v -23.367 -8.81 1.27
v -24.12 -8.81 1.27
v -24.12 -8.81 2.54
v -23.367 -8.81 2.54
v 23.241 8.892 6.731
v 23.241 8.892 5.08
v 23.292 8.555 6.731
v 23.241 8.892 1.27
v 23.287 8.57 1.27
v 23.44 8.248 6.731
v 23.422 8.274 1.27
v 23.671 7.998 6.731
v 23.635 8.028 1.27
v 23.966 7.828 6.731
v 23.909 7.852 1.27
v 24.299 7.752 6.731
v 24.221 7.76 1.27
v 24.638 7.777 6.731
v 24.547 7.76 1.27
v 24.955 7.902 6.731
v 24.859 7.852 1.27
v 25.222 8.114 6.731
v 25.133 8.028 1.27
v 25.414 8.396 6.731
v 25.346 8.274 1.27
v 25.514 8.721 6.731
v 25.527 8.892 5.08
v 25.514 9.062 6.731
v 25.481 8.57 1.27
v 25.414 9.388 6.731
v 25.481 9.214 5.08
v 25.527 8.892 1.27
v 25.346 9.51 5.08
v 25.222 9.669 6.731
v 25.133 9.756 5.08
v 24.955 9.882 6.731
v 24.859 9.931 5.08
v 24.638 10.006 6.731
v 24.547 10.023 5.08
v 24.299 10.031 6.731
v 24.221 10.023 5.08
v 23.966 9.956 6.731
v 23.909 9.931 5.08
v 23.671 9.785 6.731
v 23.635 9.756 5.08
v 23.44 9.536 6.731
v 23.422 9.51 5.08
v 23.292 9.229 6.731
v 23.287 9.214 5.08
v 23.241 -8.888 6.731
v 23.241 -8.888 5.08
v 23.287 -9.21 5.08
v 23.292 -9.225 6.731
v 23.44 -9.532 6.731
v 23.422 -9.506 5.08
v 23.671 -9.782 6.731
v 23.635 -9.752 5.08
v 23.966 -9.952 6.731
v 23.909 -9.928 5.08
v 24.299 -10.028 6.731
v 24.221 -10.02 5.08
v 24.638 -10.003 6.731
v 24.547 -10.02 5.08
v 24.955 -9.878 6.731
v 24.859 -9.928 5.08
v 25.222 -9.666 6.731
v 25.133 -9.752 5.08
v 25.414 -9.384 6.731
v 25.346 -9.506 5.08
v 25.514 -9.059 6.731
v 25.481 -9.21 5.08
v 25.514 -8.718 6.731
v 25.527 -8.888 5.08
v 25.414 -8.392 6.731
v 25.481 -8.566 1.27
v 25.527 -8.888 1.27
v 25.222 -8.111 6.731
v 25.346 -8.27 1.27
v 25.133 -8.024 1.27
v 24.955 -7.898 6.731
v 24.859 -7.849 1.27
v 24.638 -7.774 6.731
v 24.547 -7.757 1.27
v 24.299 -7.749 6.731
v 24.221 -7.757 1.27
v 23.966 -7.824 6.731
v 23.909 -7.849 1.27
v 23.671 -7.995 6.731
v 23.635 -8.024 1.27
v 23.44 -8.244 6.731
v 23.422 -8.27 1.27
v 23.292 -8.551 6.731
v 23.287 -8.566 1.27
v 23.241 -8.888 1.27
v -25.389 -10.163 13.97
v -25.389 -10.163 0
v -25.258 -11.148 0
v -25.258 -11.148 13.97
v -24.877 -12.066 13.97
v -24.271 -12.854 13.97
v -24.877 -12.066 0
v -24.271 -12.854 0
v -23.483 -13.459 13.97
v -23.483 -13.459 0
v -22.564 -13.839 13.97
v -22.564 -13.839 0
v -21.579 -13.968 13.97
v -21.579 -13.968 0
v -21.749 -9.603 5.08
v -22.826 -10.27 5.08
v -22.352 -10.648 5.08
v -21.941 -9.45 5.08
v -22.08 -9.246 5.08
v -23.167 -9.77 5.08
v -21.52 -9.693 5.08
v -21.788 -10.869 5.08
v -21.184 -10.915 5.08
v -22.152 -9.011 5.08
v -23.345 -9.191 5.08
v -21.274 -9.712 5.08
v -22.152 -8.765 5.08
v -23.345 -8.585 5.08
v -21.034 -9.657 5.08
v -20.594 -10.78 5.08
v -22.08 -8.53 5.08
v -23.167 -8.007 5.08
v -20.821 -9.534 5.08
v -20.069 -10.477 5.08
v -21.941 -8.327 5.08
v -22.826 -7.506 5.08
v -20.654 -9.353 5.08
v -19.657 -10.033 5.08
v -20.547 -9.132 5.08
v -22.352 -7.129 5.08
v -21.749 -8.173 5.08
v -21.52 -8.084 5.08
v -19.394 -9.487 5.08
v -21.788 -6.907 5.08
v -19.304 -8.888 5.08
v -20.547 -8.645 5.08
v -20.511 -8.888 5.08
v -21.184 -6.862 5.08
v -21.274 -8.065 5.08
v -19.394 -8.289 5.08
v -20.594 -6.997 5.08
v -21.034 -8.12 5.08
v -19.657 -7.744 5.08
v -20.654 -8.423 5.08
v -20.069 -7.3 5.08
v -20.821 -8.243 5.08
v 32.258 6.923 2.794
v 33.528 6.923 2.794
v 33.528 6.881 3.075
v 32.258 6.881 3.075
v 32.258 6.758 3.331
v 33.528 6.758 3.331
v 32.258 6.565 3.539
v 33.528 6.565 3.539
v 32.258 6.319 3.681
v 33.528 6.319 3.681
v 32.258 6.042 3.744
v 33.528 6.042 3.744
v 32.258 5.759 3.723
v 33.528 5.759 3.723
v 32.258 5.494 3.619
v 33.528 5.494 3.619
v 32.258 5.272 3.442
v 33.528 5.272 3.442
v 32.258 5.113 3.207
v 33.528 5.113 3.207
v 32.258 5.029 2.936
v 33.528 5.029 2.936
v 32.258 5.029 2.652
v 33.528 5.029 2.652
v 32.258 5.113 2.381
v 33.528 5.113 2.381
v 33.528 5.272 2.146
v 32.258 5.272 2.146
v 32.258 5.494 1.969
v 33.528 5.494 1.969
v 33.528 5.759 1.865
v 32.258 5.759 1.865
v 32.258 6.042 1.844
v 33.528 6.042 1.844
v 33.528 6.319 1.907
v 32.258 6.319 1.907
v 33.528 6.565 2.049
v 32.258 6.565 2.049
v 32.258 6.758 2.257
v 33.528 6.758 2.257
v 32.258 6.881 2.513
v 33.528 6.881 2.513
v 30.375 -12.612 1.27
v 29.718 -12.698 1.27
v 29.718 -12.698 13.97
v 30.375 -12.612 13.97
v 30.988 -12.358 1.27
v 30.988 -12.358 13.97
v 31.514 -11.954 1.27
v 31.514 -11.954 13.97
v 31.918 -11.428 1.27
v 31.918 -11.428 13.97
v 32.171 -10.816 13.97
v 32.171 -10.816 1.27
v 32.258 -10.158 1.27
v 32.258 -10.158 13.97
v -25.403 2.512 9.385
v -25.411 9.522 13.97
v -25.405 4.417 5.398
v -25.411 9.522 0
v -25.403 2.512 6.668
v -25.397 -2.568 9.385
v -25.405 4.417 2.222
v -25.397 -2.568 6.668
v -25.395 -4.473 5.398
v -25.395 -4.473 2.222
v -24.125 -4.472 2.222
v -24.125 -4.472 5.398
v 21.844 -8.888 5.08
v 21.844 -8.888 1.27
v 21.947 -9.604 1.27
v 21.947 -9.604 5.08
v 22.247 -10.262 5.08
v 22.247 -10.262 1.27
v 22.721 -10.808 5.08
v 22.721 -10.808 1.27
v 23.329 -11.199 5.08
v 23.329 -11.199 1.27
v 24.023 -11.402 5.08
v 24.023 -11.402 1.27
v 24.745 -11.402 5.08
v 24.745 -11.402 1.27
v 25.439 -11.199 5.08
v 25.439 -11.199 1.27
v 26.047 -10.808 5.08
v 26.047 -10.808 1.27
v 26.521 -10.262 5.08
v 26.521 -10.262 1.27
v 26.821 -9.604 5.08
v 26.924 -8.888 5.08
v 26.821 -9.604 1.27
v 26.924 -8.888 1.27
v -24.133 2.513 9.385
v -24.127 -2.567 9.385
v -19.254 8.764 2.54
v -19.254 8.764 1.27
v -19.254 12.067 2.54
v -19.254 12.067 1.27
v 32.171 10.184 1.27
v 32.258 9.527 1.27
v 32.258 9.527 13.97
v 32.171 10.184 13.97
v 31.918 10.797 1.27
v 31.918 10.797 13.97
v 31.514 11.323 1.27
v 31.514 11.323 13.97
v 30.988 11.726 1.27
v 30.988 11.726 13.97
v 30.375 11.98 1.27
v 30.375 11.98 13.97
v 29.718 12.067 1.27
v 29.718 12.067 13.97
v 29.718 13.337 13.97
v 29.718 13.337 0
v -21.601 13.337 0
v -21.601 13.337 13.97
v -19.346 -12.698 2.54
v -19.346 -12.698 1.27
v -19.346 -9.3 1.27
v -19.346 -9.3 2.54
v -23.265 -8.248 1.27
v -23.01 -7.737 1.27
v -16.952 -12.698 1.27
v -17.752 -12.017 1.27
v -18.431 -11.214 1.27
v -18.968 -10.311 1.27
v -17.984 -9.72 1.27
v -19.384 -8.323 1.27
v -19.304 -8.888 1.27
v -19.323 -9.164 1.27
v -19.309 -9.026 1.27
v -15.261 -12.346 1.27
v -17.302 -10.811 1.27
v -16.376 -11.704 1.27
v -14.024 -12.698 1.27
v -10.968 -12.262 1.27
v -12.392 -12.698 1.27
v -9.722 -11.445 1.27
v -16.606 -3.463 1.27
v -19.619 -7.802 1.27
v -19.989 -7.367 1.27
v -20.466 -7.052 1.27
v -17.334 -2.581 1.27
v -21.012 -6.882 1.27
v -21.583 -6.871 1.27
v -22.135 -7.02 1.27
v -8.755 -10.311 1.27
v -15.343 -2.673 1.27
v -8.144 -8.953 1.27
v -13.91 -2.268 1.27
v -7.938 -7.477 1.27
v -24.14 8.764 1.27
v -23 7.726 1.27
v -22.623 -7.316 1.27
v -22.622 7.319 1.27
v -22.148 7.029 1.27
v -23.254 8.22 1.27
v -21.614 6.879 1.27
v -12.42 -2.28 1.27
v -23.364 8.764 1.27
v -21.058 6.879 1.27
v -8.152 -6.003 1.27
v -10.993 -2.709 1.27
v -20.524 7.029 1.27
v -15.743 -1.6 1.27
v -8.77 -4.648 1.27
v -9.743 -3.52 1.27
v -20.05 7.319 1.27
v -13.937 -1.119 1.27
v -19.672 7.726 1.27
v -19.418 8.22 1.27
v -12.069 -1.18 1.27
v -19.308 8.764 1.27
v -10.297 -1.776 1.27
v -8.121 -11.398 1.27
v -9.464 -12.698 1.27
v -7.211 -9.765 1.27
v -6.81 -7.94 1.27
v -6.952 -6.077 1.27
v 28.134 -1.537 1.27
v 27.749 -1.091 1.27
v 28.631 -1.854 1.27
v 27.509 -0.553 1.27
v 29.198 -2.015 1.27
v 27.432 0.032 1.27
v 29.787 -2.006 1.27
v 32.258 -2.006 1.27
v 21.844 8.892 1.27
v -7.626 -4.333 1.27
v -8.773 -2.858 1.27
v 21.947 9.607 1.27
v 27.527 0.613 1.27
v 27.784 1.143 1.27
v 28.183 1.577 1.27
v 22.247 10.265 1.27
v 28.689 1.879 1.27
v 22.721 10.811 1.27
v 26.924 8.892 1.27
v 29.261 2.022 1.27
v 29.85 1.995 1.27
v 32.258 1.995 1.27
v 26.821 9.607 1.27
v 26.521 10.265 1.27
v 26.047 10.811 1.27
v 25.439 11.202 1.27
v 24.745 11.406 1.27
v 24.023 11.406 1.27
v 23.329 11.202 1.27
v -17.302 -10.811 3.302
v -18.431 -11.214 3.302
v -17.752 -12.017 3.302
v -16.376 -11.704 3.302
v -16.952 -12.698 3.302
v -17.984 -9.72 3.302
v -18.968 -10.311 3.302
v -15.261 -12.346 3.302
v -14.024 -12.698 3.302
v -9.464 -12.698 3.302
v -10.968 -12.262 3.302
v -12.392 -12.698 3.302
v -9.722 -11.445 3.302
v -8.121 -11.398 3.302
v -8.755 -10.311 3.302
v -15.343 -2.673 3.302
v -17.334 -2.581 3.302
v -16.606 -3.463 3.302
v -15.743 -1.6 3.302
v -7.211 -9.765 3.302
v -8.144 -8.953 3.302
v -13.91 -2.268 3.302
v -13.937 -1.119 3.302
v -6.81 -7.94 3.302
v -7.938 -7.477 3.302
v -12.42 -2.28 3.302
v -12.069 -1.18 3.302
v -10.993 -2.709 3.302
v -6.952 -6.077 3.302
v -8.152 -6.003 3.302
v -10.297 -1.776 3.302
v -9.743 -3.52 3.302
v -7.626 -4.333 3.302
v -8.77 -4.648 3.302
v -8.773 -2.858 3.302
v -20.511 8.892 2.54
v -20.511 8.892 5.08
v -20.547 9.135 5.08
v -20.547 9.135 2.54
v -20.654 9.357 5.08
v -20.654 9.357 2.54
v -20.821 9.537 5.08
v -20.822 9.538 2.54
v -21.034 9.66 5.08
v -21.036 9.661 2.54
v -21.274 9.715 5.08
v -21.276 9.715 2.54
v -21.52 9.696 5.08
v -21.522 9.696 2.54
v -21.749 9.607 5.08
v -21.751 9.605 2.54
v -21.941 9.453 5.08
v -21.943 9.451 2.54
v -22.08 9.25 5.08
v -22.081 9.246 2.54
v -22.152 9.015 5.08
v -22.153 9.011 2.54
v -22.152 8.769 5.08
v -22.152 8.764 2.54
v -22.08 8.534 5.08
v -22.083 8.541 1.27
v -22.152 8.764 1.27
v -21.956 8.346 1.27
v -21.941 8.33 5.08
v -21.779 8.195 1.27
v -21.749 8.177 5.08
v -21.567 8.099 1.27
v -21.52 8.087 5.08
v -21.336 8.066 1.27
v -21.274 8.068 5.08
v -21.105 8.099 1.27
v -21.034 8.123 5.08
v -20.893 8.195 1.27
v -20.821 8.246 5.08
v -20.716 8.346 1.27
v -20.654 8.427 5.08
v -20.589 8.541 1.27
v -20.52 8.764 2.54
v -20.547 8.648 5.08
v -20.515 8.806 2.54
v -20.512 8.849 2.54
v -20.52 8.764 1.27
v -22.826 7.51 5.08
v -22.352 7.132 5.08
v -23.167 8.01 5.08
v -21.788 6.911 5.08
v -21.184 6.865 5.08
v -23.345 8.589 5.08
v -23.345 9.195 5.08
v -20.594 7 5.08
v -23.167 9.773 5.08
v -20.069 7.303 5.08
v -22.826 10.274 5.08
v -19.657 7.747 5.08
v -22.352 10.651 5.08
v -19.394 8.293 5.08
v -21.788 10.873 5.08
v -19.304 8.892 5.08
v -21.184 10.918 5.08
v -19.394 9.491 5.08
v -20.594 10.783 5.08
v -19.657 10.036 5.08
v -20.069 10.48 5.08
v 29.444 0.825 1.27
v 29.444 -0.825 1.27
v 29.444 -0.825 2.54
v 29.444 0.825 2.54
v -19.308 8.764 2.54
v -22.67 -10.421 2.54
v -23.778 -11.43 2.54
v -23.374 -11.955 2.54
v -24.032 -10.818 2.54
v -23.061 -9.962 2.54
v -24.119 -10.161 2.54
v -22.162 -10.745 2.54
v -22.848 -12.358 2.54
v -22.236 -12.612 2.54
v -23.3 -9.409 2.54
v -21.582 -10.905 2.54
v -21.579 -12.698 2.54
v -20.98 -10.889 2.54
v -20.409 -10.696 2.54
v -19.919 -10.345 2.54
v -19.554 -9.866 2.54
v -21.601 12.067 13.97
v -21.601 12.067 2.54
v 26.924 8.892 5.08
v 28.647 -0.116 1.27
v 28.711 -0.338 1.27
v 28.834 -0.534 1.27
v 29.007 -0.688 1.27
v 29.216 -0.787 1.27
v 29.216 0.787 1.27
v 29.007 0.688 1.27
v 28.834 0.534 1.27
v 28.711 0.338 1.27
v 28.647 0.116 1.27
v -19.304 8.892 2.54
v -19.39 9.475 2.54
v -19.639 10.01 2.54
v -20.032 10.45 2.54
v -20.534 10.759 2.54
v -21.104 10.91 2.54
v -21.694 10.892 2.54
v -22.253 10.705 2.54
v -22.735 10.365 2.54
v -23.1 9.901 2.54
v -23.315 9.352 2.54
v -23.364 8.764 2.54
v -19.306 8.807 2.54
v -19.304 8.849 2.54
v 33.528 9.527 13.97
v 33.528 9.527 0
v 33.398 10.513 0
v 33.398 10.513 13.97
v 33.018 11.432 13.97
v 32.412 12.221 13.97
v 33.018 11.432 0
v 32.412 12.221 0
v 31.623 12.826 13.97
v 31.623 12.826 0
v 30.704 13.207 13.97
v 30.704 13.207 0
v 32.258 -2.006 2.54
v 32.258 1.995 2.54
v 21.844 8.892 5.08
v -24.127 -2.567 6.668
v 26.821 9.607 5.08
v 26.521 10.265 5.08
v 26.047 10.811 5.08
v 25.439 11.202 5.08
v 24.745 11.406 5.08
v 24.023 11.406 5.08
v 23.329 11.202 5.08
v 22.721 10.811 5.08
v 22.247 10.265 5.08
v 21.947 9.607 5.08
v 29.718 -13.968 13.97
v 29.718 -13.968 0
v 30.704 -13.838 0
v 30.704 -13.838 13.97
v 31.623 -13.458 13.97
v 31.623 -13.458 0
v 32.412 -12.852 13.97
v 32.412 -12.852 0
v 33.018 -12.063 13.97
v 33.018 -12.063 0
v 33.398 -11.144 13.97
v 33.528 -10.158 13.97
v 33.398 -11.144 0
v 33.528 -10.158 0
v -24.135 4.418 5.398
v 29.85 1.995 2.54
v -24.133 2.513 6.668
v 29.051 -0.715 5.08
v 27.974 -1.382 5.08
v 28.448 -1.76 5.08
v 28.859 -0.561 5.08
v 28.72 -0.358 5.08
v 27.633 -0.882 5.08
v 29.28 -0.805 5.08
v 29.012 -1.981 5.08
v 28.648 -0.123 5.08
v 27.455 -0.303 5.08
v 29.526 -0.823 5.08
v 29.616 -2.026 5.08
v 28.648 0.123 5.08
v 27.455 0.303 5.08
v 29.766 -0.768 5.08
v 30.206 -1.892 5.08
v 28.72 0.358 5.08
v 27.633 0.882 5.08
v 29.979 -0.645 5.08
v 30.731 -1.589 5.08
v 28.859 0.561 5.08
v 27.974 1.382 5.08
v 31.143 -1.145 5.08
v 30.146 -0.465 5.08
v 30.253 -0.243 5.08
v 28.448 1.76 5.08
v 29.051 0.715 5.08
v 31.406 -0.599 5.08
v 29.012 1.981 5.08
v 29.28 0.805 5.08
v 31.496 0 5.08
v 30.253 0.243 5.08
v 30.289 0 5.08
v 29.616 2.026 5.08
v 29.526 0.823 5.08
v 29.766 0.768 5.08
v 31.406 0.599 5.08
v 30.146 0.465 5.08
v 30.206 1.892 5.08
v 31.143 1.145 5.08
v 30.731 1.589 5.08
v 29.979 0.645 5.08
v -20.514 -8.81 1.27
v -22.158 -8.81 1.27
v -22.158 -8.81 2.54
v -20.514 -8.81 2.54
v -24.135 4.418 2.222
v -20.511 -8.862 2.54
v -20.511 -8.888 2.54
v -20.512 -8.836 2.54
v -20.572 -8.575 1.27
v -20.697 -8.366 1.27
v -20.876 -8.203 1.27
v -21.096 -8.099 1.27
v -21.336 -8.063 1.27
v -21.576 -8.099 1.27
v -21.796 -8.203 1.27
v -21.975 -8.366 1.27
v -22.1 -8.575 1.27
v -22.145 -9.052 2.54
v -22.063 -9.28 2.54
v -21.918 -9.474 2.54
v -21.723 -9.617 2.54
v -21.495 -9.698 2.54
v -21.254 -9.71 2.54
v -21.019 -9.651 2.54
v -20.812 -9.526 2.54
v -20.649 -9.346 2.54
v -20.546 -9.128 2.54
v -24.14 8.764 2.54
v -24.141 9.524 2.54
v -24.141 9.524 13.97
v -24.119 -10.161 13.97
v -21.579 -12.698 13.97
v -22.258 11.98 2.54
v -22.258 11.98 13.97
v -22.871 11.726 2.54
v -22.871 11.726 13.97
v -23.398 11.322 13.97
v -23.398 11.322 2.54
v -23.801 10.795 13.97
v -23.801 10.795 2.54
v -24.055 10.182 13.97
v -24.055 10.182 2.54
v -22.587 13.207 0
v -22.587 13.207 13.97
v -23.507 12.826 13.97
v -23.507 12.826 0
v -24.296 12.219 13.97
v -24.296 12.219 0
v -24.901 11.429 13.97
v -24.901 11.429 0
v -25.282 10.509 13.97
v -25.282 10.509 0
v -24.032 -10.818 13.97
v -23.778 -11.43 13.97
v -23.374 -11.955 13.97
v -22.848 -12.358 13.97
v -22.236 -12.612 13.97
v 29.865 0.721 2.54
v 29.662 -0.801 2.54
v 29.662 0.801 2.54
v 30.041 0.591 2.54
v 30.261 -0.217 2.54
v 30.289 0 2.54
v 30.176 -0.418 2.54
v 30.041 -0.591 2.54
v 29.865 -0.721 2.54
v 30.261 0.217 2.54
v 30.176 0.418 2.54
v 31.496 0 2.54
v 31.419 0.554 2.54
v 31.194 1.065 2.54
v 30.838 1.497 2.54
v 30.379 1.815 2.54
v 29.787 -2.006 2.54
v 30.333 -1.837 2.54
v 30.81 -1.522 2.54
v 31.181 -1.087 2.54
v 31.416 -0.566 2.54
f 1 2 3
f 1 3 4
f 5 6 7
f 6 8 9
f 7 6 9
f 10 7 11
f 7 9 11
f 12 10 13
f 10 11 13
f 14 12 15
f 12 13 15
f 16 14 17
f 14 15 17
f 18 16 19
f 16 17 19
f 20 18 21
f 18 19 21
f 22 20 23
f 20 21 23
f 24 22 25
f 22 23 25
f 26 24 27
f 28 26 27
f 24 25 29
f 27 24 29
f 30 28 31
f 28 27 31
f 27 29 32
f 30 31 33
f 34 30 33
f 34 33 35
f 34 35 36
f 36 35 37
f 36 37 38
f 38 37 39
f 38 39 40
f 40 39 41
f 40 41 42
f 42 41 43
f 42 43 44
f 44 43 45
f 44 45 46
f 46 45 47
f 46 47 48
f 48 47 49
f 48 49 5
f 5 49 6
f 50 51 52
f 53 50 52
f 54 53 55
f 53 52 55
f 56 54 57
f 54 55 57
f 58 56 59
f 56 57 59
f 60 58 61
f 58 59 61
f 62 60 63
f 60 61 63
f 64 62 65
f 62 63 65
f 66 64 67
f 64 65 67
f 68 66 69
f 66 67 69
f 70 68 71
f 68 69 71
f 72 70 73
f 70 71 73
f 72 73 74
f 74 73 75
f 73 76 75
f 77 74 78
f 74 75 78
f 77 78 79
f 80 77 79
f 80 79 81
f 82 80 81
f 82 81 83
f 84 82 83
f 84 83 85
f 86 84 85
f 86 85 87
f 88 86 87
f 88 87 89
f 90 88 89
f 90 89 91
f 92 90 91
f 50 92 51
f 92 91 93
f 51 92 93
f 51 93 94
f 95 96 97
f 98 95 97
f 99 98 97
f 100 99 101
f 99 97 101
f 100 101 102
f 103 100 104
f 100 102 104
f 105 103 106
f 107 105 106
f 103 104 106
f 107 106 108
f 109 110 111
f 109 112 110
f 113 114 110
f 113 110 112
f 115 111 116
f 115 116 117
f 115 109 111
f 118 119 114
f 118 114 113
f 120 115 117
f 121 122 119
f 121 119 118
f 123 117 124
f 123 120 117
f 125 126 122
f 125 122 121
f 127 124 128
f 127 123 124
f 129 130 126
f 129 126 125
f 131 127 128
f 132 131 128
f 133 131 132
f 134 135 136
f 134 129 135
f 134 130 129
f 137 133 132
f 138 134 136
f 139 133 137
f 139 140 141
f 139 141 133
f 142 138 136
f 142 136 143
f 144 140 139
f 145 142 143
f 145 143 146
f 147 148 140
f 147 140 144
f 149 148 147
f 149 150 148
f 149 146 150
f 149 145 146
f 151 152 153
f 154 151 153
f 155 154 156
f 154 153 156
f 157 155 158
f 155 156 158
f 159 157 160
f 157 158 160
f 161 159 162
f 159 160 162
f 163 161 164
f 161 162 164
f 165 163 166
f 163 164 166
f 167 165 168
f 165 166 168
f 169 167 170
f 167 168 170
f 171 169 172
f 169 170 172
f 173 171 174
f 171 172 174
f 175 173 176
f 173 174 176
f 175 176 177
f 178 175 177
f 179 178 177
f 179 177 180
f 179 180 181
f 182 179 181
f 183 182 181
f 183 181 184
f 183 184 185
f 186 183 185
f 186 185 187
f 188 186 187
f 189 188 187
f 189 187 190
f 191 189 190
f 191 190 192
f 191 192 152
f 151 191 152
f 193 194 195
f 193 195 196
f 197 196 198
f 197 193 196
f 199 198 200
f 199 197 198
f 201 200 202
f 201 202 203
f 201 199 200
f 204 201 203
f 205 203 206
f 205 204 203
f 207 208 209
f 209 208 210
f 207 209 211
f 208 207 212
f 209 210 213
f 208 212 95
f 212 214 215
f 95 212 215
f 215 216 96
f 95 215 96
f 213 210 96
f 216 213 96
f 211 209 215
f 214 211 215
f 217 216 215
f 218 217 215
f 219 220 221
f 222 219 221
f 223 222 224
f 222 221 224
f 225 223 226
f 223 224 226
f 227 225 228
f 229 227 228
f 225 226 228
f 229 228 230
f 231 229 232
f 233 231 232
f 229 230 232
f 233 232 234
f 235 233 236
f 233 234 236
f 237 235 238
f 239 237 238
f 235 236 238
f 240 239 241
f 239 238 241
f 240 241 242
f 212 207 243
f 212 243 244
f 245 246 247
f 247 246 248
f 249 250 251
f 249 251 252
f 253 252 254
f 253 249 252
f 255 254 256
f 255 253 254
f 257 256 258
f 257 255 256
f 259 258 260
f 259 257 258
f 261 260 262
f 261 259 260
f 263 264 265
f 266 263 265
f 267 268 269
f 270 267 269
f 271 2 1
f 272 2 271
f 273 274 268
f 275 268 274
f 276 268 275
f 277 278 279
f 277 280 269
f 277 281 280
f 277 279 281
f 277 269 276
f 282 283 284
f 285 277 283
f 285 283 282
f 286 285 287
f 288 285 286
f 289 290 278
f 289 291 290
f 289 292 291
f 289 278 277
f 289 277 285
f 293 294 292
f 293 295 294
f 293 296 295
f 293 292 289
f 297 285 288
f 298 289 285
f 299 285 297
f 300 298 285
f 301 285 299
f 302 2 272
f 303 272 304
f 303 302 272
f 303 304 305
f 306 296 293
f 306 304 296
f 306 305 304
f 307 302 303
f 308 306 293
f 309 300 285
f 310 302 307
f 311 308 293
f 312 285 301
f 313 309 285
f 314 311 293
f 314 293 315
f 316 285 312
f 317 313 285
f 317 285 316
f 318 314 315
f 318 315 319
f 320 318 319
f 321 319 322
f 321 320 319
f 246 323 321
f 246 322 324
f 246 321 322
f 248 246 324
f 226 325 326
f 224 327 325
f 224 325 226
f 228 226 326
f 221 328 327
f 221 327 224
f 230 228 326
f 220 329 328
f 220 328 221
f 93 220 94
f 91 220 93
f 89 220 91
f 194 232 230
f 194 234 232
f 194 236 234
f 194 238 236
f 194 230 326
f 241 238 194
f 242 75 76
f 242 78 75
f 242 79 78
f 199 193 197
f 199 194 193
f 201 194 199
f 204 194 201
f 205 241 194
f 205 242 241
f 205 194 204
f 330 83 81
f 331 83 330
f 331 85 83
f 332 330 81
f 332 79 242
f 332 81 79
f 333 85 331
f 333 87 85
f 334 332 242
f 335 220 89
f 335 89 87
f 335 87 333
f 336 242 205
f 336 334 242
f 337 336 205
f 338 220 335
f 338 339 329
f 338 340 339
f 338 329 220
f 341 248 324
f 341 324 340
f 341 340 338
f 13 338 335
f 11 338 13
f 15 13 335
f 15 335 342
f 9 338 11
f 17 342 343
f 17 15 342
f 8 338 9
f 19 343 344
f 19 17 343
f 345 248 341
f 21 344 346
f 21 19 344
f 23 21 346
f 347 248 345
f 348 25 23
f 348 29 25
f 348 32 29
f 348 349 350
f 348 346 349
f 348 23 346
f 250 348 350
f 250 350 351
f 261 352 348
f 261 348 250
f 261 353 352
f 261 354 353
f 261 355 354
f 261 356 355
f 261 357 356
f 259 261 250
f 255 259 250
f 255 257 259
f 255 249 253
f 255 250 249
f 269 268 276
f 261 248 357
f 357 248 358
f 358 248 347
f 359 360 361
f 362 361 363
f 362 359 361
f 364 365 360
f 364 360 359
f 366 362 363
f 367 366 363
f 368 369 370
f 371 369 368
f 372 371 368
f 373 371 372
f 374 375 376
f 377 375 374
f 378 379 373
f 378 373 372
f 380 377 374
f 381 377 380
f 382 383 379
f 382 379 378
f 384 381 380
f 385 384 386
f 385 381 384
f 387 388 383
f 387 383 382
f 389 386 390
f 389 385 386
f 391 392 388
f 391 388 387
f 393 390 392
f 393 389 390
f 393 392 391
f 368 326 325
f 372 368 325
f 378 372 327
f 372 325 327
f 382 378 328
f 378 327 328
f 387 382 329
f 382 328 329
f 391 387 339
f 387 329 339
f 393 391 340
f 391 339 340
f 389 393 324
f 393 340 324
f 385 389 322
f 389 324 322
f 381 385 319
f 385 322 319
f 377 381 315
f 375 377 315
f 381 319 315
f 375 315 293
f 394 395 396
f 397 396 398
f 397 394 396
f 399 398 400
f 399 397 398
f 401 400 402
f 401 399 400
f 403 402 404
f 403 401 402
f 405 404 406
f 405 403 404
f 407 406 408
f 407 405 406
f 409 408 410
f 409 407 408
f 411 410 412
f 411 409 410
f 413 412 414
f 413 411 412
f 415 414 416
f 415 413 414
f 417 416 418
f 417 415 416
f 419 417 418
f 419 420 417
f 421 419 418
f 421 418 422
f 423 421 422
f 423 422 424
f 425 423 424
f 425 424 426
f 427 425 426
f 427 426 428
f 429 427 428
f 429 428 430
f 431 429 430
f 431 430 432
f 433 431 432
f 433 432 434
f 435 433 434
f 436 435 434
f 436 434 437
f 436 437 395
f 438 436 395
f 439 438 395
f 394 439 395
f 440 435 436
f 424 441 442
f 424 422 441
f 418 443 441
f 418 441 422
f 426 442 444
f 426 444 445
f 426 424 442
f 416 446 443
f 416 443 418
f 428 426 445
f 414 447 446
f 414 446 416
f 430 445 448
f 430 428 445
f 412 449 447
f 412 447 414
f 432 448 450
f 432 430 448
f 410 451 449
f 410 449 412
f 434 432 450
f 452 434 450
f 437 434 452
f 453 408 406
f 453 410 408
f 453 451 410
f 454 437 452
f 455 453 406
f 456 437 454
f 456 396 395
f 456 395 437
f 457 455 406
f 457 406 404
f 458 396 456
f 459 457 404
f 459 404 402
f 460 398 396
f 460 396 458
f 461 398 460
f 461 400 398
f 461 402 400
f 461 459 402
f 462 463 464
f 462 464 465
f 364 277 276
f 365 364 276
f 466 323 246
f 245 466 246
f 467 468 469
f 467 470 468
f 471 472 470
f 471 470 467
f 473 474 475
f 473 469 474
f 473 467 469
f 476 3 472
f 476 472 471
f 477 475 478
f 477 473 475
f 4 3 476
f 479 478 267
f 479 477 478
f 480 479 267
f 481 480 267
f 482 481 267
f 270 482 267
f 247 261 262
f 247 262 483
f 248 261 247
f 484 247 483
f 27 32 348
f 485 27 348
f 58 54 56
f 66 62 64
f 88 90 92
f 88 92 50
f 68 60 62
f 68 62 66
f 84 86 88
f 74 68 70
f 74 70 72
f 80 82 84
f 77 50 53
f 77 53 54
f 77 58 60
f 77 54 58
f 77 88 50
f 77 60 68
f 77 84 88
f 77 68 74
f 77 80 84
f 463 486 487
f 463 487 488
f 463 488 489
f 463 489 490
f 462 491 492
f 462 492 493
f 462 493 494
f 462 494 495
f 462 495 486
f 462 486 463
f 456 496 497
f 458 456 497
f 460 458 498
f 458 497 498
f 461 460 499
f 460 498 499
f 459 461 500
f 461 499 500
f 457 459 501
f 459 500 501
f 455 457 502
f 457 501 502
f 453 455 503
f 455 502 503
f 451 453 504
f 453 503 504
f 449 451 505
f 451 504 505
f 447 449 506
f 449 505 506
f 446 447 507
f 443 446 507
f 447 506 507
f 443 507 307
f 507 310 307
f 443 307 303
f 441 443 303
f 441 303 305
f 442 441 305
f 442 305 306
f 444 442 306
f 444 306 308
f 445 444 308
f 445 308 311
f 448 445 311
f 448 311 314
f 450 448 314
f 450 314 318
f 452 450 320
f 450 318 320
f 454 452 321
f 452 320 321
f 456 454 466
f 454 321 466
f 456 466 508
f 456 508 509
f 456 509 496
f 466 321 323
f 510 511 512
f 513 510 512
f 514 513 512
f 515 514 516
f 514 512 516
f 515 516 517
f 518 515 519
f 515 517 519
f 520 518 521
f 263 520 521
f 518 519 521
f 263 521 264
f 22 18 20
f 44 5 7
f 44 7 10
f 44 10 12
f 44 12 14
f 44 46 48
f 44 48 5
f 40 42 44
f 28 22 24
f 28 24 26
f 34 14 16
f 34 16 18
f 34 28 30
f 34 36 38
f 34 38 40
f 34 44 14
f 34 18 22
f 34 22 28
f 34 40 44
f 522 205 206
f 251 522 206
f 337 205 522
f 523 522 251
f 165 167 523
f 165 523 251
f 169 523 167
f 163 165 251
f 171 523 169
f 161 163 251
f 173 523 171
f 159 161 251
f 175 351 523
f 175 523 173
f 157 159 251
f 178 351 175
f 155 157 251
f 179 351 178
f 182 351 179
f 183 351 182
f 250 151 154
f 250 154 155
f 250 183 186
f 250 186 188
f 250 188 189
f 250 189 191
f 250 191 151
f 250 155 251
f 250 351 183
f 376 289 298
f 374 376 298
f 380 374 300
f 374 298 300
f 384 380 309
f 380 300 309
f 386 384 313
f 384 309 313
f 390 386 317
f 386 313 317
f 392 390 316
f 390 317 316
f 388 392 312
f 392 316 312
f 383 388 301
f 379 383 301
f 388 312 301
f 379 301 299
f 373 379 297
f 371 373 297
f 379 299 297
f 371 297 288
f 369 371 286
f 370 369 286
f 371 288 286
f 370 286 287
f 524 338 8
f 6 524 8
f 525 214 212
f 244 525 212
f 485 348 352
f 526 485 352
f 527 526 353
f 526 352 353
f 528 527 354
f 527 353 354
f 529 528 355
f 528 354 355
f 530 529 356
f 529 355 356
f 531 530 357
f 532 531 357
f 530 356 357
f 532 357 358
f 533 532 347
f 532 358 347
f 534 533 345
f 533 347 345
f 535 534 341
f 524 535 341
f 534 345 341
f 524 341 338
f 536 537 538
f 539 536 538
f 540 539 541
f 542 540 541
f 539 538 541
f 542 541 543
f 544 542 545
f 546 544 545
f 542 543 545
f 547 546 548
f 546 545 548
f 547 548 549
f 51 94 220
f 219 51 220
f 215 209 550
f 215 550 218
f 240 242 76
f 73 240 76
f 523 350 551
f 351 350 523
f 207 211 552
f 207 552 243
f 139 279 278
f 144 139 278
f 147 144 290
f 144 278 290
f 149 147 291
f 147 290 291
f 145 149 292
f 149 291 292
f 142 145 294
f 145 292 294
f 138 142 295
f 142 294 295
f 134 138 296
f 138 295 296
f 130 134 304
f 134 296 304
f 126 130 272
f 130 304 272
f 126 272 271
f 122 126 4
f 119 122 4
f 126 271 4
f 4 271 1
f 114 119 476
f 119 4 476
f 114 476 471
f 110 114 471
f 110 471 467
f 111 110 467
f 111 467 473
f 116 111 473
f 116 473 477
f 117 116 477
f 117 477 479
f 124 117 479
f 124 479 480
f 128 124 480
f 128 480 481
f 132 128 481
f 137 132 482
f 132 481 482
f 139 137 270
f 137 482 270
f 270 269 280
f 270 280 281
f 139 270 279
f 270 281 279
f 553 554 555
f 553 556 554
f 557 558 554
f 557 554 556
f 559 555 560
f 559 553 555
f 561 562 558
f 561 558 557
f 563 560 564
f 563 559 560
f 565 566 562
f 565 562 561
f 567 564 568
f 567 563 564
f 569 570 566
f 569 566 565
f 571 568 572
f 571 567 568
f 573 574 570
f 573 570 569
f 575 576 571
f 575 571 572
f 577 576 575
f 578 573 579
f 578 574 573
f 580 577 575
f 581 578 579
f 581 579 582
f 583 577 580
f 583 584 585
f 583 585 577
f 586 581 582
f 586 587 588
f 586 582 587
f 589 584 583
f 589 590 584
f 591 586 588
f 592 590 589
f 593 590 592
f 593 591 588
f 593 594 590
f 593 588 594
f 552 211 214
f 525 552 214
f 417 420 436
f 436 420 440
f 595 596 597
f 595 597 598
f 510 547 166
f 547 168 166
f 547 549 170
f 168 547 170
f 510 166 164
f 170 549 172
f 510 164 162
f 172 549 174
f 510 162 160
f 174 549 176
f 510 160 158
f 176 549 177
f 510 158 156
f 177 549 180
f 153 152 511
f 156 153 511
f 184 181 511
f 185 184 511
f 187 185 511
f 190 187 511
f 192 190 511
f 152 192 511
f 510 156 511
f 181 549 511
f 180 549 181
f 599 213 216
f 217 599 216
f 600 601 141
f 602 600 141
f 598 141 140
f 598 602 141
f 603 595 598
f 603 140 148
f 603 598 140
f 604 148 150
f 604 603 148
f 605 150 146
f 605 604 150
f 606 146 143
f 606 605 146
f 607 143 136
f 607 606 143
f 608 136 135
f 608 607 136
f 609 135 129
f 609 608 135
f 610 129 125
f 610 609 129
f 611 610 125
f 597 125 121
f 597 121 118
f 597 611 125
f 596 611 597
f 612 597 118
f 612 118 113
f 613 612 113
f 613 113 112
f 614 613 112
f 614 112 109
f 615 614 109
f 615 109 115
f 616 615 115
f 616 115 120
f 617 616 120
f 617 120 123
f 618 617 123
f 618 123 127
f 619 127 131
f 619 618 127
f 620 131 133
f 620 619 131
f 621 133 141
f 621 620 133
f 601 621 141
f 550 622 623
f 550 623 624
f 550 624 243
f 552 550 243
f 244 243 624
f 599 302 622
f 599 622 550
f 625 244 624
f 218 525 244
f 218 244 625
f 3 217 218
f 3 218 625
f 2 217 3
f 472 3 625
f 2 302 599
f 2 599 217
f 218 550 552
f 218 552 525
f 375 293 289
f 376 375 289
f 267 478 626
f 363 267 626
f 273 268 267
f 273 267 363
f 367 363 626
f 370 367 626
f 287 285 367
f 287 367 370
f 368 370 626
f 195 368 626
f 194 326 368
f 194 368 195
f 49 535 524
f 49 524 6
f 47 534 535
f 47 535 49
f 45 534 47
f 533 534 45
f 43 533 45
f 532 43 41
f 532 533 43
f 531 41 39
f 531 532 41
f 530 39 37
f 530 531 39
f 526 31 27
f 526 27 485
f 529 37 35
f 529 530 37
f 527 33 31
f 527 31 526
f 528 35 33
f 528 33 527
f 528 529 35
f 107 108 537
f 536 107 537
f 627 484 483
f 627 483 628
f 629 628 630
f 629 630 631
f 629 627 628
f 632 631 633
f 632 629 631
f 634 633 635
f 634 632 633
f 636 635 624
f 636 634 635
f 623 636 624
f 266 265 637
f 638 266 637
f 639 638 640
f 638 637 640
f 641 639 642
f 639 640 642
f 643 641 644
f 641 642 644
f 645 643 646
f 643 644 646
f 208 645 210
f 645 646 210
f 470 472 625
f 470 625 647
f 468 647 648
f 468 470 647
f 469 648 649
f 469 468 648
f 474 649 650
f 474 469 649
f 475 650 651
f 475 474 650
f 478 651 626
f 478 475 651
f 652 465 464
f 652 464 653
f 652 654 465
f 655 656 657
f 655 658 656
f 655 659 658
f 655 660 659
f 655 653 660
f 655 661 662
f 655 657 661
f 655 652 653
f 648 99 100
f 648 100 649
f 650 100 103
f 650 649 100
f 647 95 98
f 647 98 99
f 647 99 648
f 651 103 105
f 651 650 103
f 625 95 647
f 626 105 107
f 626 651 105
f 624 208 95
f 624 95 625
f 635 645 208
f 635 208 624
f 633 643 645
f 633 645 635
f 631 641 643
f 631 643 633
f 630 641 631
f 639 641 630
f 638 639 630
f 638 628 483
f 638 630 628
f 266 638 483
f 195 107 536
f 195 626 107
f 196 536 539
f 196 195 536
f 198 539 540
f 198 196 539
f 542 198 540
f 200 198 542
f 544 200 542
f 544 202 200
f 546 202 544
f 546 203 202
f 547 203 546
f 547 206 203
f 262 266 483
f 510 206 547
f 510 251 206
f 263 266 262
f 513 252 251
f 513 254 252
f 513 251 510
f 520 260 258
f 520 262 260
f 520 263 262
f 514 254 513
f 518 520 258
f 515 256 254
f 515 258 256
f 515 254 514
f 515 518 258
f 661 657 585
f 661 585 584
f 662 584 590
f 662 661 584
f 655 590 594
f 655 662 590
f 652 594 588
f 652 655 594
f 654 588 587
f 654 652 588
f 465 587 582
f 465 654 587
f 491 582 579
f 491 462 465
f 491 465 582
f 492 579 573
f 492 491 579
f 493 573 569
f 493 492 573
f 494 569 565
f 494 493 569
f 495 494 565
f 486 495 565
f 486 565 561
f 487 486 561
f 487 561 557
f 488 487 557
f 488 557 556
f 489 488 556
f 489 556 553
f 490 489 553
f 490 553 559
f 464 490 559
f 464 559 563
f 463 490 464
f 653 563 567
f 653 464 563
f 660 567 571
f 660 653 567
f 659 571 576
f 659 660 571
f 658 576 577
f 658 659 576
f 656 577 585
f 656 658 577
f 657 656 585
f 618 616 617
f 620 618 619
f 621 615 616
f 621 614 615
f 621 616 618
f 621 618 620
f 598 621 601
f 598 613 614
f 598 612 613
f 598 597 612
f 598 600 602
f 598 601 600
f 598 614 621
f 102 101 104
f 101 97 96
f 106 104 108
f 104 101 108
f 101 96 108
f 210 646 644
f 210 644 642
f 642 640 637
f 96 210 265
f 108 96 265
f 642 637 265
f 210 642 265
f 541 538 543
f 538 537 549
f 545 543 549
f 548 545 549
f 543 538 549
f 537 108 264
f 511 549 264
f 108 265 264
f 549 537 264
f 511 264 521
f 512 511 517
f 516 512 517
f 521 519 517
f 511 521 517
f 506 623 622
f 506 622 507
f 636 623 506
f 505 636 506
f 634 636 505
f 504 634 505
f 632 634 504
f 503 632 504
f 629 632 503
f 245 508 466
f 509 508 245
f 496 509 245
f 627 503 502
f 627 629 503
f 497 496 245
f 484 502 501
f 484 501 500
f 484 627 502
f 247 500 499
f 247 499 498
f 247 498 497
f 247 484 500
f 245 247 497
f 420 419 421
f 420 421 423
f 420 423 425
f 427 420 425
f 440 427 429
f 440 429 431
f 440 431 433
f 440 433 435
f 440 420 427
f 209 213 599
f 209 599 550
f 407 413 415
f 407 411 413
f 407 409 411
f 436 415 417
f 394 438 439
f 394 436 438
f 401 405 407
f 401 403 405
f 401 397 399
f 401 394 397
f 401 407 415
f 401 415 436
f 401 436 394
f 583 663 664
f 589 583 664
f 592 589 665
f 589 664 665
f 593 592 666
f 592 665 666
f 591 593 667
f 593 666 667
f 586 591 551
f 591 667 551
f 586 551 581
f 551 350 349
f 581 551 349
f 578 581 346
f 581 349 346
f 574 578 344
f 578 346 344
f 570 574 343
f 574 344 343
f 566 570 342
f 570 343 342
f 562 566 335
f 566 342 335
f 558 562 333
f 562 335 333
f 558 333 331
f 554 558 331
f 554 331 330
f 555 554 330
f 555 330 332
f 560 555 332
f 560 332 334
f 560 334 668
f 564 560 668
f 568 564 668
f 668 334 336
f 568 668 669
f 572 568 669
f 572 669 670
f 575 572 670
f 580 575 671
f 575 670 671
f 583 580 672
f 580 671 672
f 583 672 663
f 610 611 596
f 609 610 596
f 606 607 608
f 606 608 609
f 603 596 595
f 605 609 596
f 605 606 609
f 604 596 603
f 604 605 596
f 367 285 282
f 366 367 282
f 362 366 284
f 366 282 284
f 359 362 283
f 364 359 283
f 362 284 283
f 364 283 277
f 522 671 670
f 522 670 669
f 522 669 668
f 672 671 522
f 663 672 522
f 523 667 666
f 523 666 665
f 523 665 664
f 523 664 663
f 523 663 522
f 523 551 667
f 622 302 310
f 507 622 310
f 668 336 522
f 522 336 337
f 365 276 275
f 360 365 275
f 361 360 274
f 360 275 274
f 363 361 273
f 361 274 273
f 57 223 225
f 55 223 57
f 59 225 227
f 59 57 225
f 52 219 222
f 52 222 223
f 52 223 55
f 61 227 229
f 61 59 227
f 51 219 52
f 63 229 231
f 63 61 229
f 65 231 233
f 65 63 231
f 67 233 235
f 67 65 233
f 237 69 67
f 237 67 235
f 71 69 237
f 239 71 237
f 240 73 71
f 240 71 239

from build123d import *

# Parameters (mm, degrees)
F1_DEPTH  = 13.97
F2_T      = -1.27
F3_R      = 2.032
F3_R_2    = 0.8255
F4_DEPTH  = 3.81
F5_DEPTH  = 5.461
F6_DEPTH  = 2.54
F7_W      = 8.89
F7_H      = 3.1753103511
F7_W_2    = 5.08
F7_H_2    = 2.7178
F8_DEPTH  = 1.905
F9_R      = 0.9525
F10_DEPTH = 1.905
F11_R     = 2.032
F11_R_2   = 0.8255
F12_DEPTH = 3.81
F14_DEPTH = 2.032
F15_W     = 3.3083129674
F15_H     = 4.001185298
F15_W_2   = 4.9948431551
F15_H_2   = 3.4223934636
F15_W_3   = 4.9023460597
F15_H_3   = 4.0236227214
F16_DEPTH = 1.27


with BuildPart() as f1:
    # F0 (on Top) → F1 (new body)
    with BuildSketch(Plane.XY):
        with BuildLine():
            Line((-21.5788040441, -13.9683183577), (29.7179990722, -13.9683183577))
            ThreePointArc((29.7179990722, -13.9683183577), (32.4120759085, -12.852395194), (33.5279990722, -10.1583183577))
            Line((33.5279990722, -10.1583183577), (33.5279990722, 9.5266816423))
            ThreePointArc((33.5279990722, 9.5266816423), (32.4120759085, 12.2207584786), (29.7179990722, 13.3366816423))
            Line((29.7179990722, 13.3366816423), (-21.60052527, 13.3366816423))
            ThreePointArc((-21.60052527, 13.3366816423), (-24.2960880723, 12.2192716925), (-25.4105229505, 9.5224775366))
            Line((-25.4105229505, 9.5224775366), (-25.3888017246, -10.1625224634))
            ThreePointArc((-25.3888017246, -10.1625224634), (-24.2713940943, -12.8538811601), (-21.5788040441, -13.9683183577))
        make_face()
    extrude(amount=F1_DEPTH)

    # F2
    f2_openings = [f1.faces().sort_by_distance(p)[0] for p in [
        (4.064166, -0.31477, 13.97),
    ]]
    offset(amount=F2_T, openings=f2_openings)

    # F3 (on face) → F4 (join)
    with BuildSketch(Plane.XY.offset(1.27)):
        with Locations((-21.3360009278, 8.8916816423)):
            Circle(F3_R)
        with Locations((-21.3360009278, 8.8916816423)):
            Circle(F3_R_2, mode=Mode.SUBTRACT)
        with Locations((-21.3360009278, -8.8883183577)):
            Circle(F3_R)
        with Locations((-21.3360009278, -8.8883183577)):
            Circle(F3_R_2, mode=Mode.SUBTRACT)
        with BuildLine():
            Line((26.9239990722, -8.8883183577), (25.5269990722, -8.8883183577))
            ThreePointArc((25.5269990722, -8.8883183577), (24.3839990722, -10.0313183577), (23.2409990722, -8.8883183577))
            Line((23.2409990722, -8.8883183577), (21.8439990722, -8.8883183577))
            ThreePointArc((21.8439990722, -8.8883183577), (24.3839990722, -11.4283183577), (26.9239990722, -8.8883183577))
        make_face()
        with BuildLine():
            ThreePointArc((23.2409990722, 8.8916816423), (24.3839990722, 10.0346816423), (25.5269990722, 8.8916816423))
            Line((25.5269990722, 8.8916816423), (26.9239990722, 8.8916816423))
            ThreePointArc((26.9239990722, 8.8916816423), (24.3839990722, 11.4316816423), (21.8439990722, 8.8916816423))
            Line((21.8439990722, 8.8916816423), (23.2409990722, 8.8916816423))
        make_face()
    extrude(amount=F4_DEPTH)

    # F3 (on face) → F5 (join)
    with BuildSketch(Plane.XY.offset(1.27)):
        with BuildLine():
            Line((24.3839990722, 8.8916816423), (25.5269990722, 8.8916816423))
            ThreePointArc((25.5269990722, 8.8916816423), (24.3839990722, 10.0346816423), (23.2409990722, 8.8916816423))
            Line((23.2409990722, 8.8916816423), (24.3839990722, 8.8916816423))
        make_face()
        with BuildLine():
            ThreePointArc((23.2409990722, 8.8916816423), (24.3839990722, 7.7486816423), (25.5269990722, 8.8916816423))
            Line((25.5269990722, 8.8916816423), (24.3839990722, 8.8916816423))
            Line((24.3839990722, 8.8916816423), (23.2409990722, 8.8916816423))
        make_face()
        with BuildLine():
            Line((24.3839990722, -8.8883183577), (25.5269990722, -8.8883183577))
            ThreePointArc((25.5269990722, -8.8883183577), (24.3839990722, -7.7453183577), (23.2409990722, -8.8883183577))
            Line((23.2409990722, -8.8883183577), (24.3839990722, -8.8883183577))
        make_face()
        with BuildLine():
            ThreePointArc((23.2409990722, -8.8883183577), (24.3839990722, -10.0313183577), (25.5269990722, -8.8883183577))
            Line((25.5269990722, -8.8883183577), (24.3839990722, -8.8883183577))
            Line((24.3839990722, -8.8883183577), (23.2409990722, -8.8883183577))
        make_face()
    extrude(amount=F5_DEPTH)

    # F3 (on face) → F6 (cut)
    with BuildSketch(Plane.XY.offset(1.27)):
        with Locations((-21.3360009278, 8.8916816423)):
            Circle(F3_R_2)
        with Locations((-21.3360009278, -8.8883183577)):
            Circle(F3_R_2)
    extrude(amount=F6_DEPTH, mode=Mode.SUBTRACT)

    # F7 (on face) → F8 (cut)
    with BuildSketch(Plane(origin=(-25.3999845367, -0.0280273712, 0), x_dir=(0.0011034398, -0.9999993912, 0), z_dir=(-0.9999993912, -0.0011034398, 0))):
        with Locations((0, 3.81)):
            Rectangle(F7_W, F7_H)
        with Locations((0, 8.0265551756)):
            Rectangle(F7_W_2, F7_H_2)
    extrude(amount=-F8_DEPTH, mode=Mode.SUBTRACT)

    # F9 (on face) → F10 (cut)
    with BuildSketch(Plane.YZ.offset(33.5279990722)):
        with Locations((5.9706816423, 2.794)):
            Circle(F9_R)
    extrude(amount=-F10_DEPTH, mode=Mode.SUBTRACT)

    # F11 (on face) → F12 (join)
    with BuildSketch(Plane.XY.offset(1.27)):
        with Locations((29.4639990722, 0)):
            Circle(F11_R)
        with Locations((29.4639990722, 0)):
            Circle(F11_R_2, mode=Mode.SUBTRACT)
    extrude(amount=F12_DEPTH)

    # F13 (on face) → F14 (join)
    with BuildSketch(Plane.XY.offset(1.27)):
        with BuildLine():
            ThreePointArc((-14.0236731965, -12.6983183577), (-16.3756129487, -11.7037291087), (-17.9839668508, -9.7202911598))
            Line((-17.9839668508, -9.7202911598), (-18.9684356708, -10.3109590834))
            ThreePointArc((-18.9684356708, -10.3109590834), (-18.1080100407, -11.6293001054), (-16.9523477667, -12.6983183577))
            Line((-16.9523477667, -12.6983183577), (-14.0236731965, -12.6983183577))
        make_face()
        with BuildLine():
            ThreePointArc((-12.3923286591, -12.6983183577), (-13.2080009278, -12.7618183577), (-14.0236731965, -12.6983183577))
            Line((-14.0236731965, -12.6983183577), (-16.9523477667, -12.6983183577))
            ThreePointArc((-16.9523477667, -12.6983183577), (-13.2080009278, -13.9048183577), (-9.4636540889, -12.6983183577))
            Line((-9.4636540889, -12.6983183577), (-12.3923286591, -12.6983183577))
        make_face()
        with BuildLine():
            ThreePointArc((-16.6064980594, -3.4628710766), (-8.4130955389, -5.303384958), (-12.3923286591, -12.6983183577))
            Line((-12.3923286591, -12.6983183577), (-9.4636540889, -12.6983183577))
            ThreePointArc((-9.4636540889, -12.6983183577), (-8.145657173, -3.5535959249), (-17.3335159362, -2.5808083877))
            Line((-17.3335159362, -2.5808083877), (-16.6064980594, -3.4628710766))
        make_face()
    extrude(amount=F14_DEPTH)

    # F15 (on face) → F16 (join)
    with BuildSketch(Plane.XY.offset(1.27)):
        with Locations((31.0986405239, -0.0055211131)):
            Rectangle(F15_W, F15_H)
        with Locations((-21.7511262745, 10.4752979241)):
            Rectangle(F15_W_2, F15_H_2)
        with Locations((-21.7973748222, -10.8221620321)):
            Rectangle(F15_W_3, F15_H_3)
    extrude(amount=F16_DEPTH)


solid = f1.part
